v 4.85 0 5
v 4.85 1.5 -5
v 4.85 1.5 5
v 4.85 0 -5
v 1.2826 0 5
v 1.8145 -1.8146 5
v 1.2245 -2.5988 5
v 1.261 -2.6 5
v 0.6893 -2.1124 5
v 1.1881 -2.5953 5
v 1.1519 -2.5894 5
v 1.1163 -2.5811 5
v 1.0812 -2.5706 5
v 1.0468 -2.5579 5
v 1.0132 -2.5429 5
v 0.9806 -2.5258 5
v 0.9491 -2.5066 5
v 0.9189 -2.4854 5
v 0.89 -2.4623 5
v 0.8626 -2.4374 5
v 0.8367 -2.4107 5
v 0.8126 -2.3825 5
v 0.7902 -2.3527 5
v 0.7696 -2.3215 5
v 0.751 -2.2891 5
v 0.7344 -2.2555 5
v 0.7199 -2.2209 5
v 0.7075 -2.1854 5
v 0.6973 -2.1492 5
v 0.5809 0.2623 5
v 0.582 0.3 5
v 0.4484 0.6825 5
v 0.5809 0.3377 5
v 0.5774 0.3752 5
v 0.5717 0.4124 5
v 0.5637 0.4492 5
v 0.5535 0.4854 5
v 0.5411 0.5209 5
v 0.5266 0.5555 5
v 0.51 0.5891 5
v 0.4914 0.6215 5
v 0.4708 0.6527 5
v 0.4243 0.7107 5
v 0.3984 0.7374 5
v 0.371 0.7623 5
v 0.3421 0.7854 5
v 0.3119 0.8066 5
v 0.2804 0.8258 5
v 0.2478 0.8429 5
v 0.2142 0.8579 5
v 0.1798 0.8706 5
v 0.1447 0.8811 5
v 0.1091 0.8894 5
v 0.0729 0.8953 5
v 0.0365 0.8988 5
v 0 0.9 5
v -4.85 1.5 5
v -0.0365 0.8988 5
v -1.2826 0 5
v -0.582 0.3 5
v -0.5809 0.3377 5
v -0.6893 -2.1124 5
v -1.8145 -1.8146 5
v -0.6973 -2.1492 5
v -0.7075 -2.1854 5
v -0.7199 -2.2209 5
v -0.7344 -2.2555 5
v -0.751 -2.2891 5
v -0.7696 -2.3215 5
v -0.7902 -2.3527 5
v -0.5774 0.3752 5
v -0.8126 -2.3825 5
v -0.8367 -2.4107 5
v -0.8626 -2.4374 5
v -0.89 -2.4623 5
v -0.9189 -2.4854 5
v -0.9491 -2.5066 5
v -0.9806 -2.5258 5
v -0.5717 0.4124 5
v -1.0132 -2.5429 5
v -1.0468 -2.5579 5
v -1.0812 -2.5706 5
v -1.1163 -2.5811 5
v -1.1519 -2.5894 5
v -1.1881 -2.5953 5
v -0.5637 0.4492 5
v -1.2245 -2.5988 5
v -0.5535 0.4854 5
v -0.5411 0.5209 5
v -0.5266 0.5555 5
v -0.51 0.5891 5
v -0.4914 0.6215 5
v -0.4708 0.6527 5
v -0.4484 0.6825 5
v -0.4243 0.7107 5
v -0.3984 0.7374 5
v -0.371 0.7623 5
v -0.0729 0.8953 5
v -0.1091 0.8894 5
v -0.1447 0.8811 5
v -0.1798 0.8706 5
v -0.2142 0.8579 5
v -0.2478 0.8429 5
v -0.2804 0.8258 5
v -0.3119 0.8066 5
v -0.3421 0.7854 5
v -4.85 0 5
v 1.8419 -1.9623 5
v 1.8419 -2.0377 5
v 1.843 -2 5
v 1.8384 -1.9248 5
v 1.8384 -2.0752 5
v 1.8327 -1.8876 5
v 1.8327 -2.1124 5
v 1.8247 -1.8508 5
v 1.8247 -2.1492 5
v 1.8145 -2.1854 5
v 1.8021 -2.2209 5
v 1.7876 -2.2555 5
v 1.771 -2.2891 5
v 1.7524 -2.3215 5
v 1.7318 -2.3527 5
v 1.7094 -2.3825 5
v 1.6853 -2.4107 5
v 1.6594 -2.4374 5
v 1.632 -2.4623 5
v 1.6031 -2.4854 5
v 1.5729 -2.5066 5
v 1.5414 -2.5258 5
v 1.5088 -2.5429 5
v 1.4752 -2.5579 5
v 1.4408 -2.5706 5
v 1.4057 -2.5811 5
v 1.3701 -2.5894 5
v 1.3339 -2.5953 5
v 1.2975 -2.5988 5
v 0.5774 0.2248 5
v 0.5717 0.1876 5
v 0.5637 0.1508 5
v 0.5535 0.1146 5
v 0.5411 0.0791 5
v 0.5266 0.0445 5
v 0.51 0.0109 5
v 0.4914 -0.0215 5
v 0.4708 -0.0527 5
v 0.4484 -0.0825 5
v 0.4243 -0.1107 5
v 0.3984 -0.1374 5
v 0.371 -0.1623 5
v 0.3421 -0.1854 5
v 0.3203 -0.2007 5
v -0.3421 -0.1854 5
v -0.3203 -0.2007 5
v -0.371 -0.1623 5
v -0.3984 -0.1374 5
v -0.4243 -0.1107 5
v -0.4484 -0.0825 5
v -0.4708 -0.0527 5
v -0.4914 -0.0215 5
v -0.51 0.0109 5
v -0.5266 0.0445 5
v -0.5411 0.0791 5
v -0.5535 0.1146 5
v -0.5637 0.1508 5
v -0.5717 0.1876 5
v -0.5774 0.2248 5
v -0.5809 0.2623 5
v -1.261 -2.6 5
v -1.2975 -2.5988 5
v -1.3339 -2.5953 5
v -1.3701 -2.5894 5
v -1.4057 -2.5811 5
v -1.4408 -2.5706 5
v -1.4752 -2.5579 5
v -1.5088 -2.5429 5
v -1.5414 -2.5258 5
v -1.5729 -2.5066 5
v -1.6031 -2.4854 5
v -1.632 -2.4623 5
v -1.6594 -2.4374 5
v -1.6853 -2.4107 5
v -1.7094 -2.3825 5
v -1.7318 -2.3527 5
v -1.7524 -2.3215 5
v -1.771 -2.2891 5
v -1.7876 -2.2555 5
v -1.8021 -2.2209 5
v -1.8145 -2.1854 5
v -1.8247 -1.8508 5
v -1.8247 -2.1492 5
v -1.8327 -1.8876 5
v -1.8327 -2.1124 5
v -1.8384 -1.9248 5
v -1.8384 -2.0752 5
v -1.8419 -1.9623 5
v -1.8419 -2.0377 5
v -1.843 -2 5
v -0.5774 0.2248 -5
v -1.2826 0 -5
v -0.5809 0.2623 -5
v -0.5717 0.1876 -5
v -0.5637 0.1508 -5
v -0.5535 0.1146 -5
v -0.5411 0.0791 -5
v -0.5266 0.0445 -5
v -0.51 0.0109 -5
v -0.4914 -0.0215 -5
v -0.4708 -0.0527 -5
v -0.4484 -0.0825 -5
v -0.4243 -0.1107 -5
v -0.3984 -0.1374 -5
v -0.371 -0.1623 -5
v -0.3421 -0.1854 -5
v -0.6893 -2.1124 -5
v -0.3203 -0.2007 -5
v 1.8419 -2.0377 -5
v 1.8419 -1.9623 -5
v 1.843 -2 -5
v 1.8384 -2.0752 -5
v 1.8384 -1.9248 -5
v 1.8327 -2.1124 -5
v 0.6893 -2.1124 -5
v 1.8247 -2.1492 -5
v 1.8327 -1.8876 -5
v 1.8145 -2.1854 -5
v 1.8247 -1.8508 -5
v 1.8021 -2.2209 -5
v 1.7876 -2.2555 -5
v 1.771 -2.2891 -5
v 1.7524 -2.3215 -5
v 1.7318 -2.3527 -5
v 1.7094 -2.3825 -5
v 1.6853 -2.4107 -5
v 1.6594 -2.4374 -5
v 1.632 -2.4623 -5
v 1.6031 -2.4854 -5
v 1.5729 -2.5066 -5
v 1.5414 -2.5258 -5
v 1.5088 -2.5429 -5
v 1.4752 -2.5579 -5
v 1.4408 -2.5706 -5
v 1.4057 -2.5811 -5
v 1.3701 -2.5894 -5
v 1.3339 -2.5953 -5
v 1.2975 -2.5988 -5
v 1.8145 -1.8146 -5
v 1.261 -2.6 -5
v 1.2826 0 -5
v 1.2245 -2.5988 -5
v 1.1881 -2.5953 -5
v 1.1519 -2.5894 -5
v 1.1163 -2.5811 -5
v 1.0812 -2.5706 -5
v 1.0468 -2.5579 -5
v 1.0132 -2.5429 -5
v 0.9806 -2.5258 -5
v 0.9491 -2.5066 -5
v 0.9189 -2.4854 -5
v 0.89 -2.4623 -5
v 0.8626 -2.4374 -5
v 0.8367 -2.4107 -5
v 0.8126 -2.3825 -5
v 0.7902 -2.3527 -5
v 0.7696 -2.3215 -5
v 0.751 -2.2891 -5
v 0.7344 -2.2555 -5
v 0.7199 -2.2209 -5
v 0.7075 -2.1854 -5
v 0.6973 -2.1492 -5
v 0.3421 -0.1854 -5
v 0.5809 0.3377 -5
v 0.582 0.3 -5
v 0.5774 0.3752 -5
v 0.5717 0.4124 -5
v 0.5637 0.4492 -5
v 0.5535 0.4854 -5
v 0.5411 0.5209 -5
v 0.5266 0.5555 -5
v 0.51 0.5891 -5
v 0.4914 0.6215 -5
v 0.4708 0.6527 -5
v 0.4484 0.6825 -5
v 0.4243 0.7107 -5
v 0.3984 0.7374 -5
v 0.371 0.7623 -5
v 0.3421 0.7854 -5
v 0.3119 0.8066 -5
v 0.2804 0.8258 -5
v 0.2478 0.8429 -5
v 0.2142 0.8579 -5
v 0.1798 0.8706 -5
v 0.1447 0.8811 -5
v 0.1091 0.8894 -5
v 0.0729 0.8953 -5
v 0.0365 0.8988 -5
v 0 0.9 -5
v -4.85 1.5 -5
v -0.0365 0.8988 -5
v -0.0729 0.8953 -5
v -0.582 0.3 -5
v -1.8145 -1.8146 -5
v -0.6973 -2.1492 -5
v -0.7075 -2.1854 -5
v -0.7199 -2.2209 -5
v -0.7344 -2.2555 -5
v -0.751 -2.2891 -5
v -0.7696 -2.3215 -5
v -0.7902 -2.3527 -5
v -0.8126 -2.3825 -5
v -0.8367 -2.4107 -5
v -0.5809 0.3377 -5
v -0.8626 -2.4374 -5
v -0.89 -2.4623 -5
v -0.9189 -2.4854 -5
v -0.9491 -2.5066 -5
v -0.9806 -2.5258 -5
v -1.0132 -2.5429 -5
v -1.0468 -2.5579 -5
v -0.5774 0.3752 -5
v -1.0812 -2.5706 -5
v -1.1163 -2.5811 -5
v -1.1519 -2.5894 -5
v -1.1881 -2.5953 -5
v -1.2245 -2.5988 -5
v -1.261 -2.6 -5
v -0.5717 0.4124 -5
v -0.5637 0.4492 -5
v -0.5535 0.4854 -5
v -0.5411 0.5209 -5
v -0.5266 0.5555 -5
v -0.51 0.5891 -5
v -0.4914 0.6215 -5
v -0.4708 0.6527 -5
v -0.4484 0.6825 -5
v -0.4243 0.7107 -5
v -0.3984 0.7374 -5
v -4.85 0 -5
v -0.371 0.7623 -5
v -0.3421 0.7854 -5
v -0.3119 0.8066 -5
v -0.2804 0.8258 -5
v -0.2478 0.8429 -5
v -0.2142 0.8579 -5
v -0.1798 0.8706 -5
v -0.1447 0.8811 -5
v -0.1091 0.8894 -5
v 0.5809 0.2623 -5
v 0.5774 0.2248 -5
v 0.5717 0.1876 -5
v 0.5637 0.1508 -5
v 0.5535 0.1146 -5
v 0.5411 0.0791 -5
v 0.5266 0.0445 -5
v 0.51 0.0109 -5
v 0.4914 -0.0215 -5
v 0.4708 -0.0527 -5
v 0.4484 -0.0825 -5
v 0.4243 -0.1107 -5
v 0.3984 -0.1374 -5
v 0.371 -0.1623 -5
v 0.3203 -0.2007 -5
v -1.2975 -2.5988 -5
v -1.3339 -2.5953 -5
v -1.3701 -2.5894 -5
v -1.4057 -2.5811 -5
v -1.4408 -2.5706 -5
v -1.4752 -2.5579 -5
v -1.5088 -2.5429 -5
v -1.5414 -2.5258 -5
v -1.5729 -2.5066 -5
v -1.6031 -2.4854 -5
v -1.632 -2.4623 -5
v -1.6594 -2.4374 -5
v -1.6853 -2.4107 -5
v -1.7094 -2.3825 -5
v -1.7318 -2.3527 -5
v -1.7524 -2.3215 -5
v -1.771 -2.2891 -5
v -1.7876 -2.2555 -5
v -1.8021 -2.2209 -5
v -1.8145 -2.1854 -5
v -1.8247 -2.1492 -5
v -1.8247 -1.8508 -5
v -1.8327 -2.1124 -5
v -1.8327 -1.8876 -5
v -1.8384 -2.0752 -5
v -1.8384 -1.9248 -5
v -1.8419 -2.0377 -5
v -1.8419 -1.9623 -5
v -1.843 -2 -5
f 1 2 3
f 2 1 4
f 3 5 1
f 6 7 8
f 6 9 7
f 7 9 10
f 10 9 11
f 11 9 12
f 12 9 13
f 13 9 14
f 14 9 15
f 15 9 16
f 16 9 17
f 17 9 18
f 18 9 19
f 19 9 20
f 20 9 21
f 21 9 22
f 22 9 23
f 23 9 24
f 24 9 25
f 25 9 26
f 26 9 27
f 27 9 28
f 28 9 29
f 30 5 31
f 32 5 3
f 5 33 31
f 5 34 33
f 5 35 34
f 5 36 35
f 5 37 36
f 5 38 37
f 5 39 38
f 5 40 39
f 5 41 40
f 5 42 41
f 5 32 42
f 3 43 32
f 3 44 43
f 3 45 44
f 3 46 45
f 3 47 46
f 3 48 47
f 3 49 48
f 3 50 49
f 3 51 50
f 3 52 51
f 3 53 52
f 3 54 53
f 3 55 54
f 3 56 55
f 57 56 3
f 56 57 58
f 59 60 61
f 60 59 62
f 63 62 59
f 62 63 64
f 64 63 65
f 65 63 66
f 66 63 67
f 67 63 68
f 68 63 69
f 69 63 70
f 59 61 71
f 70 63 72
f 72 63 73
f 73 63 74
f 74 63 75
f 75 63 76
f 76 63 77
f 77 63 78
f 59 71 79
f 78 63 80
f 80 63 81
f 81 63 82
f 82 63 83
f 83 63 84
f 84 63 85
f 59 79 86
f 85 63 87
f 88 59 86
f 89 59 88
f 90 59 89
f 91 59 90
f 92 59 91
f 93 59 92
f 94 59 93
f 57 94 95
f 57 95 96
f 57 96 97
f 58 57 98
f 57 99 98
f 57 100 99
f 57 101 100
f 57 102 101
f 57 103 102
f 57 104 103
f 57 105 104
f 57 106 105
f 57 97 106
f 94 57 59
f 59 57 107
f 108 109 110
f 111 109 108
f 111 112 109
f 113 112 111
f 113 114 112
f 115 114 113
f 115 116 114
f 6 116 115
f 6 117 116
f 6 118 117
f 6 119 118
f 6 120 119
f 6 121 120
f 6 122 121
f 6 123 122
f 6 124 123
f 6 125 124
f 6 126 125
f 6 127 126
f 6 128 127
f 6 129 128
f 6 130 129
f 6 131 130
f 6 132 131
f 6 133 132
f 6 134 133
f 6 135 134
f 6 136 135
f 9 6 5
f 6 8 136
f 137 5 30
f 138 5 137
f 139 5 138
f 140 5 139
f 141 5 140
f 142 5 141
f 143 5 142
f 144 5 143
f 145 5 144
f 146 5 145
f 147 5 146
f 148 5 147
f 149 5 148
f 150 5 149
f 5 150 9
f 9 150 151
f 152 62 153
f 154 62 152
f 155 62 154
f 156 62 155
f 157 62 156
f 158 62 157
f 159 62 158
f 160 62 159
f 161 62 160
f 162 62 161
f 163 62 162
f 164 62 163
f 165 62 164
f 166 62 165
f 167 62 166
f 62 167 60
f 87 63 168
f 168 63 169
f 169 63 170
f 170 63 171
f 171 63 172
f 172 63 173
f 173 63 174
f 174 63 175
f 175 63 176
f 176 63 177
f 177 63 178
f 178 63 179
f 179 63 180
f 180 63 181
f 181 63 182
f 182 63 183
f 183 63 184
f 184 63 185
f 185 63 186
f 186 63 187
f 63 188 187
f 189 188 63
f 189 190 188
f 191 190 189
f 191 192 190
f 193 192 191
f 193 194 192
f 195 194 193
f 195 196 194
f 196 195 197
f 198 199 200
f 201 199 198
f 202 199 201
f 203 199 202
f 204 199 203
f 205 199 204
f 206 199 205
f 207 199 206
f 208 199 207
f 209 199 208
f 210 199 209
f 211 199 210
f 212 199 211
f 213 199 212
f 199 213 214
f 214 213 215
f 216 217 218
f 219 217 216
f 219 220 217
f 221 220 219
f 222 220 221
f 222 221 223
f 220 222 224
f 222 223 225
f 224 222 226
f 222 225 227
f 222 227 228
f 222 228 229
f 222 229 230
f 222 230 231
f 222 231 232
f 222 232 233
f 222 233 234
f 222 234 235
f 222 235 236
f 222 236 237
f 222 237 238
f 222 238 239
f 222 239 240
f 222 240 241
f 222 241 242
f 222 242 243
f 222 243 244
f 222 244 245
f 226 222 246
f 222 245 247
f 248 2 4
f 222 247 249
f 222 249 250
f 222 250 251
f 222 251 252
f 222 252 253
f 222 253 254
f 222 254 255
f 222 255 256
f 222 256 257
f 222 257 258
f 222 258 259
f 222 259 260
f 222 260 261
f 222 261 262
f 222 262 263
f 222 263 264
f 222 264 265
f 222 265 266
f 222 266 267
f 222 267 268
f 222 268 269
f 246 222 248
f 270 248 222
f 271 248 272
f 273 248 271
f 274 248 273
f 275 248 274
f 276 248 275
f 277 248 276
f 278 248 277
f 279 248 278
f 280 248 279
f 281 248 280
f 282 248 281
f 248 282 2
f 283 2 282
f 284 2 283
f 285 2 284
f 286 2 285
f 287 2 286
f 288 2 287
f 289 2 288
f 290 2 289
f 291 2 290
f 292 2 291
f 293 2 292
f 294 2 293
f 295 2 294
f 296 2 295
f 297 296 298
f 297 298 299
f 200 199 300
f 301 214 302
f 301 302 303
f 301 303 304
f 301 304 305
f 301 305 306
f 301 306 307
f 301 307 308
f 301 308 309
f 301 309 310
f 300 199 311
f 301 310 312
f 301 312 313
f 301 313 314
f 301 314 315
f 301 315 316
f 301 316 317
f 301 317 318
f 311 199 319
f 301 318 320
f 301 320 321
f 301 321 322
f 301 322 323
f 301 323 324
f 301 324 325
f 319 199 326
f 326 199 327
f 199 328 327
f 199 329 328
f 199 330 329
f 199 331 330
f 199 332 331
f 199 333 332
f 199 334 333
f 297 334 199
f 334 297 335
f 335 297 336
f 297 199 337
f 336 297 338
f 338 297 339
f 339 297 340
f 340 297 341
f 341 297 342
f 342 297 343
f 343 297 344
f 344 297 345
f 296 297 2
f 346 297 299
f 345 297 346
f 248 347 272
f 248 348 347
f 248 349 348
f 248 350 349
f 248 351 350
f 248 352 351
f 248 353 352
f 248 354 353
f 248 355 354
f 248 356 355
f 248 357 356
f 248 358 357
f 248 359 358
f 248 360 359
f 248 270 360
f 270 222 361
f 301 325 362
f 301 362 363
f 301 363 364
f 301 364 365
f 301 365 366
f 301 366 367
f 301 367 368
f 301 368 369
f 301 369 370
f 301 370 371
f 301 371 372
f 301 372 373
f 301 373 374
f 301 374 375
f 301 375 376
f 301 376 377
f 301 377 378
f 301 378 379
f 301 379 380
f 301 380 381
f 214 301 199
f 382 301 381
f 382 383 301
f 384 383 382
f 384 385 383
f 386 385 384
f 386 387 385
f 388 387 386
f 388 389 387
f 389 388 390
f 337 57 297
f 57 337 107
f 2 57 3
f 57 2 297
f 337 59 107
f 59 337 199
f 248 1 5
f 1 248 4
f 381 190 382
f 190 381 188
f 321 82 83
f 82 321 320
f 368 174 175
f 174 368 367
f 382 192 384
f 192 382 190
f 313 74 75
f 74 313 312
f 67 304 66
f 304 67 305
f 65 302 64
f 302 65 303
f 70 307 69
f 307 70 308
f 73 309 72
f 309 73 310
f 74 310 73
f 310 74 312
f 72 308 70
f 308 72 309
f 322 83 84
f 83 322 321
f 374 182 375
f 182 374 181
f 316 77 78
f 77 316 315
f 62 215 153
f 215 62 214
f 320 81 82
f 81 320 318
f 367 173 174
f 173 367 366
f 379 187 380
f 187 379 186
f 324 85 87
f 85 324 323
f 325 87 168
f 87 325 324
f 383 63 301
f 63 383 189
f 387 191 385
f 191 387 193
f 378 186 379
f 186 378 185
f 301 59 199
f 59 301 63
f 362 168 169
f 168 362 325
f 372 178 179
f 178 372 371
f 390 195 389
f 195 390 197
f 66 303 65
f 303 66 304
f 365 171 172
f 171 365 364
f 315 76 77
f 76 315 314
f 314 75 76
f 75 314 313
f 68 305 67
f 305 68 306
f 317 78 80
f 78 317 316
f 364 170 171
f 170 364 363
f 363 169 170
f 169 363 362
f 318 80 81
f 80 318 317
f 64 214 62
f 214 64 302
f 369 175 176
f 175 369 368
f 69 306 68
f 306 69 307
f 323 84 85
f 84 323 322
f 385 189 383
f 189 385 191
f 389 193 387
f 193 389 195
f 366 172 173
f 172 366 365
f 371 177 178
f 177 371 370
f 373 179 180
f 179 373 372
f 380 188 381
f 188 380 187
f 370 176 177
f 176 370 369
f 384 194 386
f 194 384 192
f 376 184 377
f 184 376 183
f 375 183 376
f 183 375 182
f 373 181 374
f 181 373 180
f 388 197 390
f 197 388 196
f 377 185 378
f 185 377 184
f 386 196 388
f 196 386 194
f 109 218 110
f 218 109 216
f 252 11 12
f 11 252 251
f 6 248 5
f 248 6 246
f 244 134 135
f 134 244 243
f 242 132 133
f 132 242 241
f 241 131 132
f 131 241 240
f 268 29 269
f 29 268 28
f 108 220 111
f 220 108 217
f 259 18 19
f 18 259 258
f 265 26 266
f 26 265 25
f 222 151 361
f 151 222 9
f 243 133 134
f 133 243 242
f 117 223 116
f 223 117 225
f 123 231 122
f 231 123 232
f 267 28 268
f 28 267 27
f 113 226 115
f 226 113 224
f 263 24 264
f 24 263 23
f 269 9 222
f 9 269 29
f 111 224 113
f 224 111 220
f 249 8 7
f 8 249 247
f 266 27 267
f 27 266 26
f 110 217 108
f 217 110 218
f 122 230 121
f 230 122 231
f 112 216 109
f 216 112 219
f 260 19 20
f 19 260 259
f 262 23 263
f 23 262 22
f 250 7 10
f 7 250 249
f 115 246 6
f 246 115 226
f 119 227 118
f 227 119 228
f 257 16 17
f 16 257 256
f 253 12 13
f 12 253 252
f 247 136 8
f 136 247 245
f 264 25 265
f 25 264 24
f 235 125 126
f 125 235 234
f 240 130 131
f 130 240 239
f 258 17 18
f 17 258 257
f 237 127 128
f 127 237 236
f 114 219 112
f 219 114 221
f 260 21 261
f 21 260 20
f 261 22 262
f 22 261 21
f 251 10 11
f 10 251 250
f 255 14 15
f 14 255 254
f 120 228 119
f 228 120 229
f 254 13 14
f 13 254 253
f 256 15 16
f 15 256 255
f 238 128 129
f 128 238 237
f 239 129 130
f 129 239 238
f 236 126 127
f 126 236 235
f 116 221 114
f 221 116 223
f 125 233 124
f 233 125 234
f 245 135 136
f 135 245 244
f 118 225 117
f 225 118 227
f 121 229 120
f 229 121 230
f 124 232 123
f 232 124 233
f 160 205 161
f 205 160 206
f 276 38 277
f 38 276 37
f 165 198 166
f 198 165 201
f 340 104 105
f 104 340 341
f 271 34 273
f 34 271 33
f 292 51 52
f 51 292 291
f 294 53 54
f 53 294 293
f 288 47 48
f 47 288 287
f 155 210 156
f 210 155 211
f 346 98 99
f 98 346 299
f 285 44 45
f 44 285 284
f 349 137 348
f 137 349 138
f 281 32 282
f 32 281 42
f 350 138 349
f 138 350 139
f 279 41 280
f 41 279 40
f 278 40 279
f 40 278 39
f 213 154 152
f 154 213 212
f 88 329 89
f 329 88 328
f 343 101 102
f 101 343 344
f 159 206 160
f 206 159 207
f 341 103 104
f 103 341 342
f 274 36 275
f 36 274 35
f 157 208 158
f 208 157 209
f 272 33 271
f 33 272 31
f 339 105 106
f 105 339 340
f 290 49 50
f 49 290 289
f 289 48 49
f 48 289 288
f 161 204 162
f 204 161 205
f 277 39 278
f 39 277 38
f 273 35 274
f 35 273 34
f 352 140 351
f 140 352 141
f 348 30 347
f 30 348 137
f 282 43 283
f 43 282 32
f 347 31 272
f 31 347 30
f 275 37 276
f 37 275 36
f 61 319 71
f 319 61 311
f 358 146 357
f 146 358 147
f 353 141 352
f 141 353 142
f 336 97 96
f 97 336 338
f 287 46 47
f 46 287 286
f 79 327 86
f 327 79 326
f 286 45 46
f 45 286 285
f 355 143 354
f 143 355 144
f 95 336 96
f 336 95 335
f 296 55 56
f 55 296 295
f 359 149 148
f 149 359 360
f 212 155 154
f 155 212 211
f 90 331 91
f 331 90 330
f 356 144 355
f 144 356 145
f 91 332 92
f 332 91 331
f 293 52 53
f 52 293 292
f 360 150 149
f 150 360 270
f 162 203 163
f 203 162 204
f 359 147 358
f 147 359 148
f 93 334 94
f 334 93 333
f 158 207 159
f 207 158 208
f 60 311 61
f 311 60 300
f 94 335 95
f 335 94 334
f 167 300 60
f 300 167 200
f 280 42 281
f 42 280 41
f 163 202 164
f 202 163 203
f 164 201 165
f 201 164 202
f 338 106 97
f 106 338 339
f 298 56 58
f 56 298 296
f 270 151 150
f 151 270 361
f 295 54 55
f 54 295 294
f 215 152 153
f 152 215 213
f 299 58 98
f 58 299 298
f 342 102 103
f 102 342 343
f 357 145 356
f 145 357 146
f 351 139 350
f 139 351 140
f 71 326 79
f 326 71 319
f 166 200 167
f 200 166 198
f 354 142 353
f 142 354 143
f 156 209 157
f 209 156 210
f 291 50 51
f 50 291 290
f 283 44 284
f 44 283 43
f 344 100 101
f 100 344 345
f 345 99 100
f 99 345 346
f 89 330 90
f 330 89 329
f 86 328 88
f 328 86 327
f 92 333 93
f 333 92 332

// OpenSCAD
$fn=100;
plate_thickness=1.5;

module clip(x) {
    scale([.97, 1, 1]) _clip(x);
}

module _clip(x){
    difference(){
        union(){
            // Backing plate
            translate([0,plate_thickness/2,0]) cube([10,plate_thickness,x],center=true);
       
            hull(){
                    translate([-0.8,0,0])cylinder(h=x,r=0.5,center=true);
                    translate([-2.6/2,-2,0])cylinder(h=x,r=0.6,center=true);
                }
                hull(){
                    translate([0.8,0,0])cylinder(h=x,r=0.5,center=true);
                    translate([2.6/2,-2,0])cylinder(h=x,r=0.6,center=true);
                } 
          }
          
          // Cylinder cutout
          translate([0,0.3,0])cylinder(h=x+1,r=0.6,center=true);
    }
}

clip(10); //lenght
